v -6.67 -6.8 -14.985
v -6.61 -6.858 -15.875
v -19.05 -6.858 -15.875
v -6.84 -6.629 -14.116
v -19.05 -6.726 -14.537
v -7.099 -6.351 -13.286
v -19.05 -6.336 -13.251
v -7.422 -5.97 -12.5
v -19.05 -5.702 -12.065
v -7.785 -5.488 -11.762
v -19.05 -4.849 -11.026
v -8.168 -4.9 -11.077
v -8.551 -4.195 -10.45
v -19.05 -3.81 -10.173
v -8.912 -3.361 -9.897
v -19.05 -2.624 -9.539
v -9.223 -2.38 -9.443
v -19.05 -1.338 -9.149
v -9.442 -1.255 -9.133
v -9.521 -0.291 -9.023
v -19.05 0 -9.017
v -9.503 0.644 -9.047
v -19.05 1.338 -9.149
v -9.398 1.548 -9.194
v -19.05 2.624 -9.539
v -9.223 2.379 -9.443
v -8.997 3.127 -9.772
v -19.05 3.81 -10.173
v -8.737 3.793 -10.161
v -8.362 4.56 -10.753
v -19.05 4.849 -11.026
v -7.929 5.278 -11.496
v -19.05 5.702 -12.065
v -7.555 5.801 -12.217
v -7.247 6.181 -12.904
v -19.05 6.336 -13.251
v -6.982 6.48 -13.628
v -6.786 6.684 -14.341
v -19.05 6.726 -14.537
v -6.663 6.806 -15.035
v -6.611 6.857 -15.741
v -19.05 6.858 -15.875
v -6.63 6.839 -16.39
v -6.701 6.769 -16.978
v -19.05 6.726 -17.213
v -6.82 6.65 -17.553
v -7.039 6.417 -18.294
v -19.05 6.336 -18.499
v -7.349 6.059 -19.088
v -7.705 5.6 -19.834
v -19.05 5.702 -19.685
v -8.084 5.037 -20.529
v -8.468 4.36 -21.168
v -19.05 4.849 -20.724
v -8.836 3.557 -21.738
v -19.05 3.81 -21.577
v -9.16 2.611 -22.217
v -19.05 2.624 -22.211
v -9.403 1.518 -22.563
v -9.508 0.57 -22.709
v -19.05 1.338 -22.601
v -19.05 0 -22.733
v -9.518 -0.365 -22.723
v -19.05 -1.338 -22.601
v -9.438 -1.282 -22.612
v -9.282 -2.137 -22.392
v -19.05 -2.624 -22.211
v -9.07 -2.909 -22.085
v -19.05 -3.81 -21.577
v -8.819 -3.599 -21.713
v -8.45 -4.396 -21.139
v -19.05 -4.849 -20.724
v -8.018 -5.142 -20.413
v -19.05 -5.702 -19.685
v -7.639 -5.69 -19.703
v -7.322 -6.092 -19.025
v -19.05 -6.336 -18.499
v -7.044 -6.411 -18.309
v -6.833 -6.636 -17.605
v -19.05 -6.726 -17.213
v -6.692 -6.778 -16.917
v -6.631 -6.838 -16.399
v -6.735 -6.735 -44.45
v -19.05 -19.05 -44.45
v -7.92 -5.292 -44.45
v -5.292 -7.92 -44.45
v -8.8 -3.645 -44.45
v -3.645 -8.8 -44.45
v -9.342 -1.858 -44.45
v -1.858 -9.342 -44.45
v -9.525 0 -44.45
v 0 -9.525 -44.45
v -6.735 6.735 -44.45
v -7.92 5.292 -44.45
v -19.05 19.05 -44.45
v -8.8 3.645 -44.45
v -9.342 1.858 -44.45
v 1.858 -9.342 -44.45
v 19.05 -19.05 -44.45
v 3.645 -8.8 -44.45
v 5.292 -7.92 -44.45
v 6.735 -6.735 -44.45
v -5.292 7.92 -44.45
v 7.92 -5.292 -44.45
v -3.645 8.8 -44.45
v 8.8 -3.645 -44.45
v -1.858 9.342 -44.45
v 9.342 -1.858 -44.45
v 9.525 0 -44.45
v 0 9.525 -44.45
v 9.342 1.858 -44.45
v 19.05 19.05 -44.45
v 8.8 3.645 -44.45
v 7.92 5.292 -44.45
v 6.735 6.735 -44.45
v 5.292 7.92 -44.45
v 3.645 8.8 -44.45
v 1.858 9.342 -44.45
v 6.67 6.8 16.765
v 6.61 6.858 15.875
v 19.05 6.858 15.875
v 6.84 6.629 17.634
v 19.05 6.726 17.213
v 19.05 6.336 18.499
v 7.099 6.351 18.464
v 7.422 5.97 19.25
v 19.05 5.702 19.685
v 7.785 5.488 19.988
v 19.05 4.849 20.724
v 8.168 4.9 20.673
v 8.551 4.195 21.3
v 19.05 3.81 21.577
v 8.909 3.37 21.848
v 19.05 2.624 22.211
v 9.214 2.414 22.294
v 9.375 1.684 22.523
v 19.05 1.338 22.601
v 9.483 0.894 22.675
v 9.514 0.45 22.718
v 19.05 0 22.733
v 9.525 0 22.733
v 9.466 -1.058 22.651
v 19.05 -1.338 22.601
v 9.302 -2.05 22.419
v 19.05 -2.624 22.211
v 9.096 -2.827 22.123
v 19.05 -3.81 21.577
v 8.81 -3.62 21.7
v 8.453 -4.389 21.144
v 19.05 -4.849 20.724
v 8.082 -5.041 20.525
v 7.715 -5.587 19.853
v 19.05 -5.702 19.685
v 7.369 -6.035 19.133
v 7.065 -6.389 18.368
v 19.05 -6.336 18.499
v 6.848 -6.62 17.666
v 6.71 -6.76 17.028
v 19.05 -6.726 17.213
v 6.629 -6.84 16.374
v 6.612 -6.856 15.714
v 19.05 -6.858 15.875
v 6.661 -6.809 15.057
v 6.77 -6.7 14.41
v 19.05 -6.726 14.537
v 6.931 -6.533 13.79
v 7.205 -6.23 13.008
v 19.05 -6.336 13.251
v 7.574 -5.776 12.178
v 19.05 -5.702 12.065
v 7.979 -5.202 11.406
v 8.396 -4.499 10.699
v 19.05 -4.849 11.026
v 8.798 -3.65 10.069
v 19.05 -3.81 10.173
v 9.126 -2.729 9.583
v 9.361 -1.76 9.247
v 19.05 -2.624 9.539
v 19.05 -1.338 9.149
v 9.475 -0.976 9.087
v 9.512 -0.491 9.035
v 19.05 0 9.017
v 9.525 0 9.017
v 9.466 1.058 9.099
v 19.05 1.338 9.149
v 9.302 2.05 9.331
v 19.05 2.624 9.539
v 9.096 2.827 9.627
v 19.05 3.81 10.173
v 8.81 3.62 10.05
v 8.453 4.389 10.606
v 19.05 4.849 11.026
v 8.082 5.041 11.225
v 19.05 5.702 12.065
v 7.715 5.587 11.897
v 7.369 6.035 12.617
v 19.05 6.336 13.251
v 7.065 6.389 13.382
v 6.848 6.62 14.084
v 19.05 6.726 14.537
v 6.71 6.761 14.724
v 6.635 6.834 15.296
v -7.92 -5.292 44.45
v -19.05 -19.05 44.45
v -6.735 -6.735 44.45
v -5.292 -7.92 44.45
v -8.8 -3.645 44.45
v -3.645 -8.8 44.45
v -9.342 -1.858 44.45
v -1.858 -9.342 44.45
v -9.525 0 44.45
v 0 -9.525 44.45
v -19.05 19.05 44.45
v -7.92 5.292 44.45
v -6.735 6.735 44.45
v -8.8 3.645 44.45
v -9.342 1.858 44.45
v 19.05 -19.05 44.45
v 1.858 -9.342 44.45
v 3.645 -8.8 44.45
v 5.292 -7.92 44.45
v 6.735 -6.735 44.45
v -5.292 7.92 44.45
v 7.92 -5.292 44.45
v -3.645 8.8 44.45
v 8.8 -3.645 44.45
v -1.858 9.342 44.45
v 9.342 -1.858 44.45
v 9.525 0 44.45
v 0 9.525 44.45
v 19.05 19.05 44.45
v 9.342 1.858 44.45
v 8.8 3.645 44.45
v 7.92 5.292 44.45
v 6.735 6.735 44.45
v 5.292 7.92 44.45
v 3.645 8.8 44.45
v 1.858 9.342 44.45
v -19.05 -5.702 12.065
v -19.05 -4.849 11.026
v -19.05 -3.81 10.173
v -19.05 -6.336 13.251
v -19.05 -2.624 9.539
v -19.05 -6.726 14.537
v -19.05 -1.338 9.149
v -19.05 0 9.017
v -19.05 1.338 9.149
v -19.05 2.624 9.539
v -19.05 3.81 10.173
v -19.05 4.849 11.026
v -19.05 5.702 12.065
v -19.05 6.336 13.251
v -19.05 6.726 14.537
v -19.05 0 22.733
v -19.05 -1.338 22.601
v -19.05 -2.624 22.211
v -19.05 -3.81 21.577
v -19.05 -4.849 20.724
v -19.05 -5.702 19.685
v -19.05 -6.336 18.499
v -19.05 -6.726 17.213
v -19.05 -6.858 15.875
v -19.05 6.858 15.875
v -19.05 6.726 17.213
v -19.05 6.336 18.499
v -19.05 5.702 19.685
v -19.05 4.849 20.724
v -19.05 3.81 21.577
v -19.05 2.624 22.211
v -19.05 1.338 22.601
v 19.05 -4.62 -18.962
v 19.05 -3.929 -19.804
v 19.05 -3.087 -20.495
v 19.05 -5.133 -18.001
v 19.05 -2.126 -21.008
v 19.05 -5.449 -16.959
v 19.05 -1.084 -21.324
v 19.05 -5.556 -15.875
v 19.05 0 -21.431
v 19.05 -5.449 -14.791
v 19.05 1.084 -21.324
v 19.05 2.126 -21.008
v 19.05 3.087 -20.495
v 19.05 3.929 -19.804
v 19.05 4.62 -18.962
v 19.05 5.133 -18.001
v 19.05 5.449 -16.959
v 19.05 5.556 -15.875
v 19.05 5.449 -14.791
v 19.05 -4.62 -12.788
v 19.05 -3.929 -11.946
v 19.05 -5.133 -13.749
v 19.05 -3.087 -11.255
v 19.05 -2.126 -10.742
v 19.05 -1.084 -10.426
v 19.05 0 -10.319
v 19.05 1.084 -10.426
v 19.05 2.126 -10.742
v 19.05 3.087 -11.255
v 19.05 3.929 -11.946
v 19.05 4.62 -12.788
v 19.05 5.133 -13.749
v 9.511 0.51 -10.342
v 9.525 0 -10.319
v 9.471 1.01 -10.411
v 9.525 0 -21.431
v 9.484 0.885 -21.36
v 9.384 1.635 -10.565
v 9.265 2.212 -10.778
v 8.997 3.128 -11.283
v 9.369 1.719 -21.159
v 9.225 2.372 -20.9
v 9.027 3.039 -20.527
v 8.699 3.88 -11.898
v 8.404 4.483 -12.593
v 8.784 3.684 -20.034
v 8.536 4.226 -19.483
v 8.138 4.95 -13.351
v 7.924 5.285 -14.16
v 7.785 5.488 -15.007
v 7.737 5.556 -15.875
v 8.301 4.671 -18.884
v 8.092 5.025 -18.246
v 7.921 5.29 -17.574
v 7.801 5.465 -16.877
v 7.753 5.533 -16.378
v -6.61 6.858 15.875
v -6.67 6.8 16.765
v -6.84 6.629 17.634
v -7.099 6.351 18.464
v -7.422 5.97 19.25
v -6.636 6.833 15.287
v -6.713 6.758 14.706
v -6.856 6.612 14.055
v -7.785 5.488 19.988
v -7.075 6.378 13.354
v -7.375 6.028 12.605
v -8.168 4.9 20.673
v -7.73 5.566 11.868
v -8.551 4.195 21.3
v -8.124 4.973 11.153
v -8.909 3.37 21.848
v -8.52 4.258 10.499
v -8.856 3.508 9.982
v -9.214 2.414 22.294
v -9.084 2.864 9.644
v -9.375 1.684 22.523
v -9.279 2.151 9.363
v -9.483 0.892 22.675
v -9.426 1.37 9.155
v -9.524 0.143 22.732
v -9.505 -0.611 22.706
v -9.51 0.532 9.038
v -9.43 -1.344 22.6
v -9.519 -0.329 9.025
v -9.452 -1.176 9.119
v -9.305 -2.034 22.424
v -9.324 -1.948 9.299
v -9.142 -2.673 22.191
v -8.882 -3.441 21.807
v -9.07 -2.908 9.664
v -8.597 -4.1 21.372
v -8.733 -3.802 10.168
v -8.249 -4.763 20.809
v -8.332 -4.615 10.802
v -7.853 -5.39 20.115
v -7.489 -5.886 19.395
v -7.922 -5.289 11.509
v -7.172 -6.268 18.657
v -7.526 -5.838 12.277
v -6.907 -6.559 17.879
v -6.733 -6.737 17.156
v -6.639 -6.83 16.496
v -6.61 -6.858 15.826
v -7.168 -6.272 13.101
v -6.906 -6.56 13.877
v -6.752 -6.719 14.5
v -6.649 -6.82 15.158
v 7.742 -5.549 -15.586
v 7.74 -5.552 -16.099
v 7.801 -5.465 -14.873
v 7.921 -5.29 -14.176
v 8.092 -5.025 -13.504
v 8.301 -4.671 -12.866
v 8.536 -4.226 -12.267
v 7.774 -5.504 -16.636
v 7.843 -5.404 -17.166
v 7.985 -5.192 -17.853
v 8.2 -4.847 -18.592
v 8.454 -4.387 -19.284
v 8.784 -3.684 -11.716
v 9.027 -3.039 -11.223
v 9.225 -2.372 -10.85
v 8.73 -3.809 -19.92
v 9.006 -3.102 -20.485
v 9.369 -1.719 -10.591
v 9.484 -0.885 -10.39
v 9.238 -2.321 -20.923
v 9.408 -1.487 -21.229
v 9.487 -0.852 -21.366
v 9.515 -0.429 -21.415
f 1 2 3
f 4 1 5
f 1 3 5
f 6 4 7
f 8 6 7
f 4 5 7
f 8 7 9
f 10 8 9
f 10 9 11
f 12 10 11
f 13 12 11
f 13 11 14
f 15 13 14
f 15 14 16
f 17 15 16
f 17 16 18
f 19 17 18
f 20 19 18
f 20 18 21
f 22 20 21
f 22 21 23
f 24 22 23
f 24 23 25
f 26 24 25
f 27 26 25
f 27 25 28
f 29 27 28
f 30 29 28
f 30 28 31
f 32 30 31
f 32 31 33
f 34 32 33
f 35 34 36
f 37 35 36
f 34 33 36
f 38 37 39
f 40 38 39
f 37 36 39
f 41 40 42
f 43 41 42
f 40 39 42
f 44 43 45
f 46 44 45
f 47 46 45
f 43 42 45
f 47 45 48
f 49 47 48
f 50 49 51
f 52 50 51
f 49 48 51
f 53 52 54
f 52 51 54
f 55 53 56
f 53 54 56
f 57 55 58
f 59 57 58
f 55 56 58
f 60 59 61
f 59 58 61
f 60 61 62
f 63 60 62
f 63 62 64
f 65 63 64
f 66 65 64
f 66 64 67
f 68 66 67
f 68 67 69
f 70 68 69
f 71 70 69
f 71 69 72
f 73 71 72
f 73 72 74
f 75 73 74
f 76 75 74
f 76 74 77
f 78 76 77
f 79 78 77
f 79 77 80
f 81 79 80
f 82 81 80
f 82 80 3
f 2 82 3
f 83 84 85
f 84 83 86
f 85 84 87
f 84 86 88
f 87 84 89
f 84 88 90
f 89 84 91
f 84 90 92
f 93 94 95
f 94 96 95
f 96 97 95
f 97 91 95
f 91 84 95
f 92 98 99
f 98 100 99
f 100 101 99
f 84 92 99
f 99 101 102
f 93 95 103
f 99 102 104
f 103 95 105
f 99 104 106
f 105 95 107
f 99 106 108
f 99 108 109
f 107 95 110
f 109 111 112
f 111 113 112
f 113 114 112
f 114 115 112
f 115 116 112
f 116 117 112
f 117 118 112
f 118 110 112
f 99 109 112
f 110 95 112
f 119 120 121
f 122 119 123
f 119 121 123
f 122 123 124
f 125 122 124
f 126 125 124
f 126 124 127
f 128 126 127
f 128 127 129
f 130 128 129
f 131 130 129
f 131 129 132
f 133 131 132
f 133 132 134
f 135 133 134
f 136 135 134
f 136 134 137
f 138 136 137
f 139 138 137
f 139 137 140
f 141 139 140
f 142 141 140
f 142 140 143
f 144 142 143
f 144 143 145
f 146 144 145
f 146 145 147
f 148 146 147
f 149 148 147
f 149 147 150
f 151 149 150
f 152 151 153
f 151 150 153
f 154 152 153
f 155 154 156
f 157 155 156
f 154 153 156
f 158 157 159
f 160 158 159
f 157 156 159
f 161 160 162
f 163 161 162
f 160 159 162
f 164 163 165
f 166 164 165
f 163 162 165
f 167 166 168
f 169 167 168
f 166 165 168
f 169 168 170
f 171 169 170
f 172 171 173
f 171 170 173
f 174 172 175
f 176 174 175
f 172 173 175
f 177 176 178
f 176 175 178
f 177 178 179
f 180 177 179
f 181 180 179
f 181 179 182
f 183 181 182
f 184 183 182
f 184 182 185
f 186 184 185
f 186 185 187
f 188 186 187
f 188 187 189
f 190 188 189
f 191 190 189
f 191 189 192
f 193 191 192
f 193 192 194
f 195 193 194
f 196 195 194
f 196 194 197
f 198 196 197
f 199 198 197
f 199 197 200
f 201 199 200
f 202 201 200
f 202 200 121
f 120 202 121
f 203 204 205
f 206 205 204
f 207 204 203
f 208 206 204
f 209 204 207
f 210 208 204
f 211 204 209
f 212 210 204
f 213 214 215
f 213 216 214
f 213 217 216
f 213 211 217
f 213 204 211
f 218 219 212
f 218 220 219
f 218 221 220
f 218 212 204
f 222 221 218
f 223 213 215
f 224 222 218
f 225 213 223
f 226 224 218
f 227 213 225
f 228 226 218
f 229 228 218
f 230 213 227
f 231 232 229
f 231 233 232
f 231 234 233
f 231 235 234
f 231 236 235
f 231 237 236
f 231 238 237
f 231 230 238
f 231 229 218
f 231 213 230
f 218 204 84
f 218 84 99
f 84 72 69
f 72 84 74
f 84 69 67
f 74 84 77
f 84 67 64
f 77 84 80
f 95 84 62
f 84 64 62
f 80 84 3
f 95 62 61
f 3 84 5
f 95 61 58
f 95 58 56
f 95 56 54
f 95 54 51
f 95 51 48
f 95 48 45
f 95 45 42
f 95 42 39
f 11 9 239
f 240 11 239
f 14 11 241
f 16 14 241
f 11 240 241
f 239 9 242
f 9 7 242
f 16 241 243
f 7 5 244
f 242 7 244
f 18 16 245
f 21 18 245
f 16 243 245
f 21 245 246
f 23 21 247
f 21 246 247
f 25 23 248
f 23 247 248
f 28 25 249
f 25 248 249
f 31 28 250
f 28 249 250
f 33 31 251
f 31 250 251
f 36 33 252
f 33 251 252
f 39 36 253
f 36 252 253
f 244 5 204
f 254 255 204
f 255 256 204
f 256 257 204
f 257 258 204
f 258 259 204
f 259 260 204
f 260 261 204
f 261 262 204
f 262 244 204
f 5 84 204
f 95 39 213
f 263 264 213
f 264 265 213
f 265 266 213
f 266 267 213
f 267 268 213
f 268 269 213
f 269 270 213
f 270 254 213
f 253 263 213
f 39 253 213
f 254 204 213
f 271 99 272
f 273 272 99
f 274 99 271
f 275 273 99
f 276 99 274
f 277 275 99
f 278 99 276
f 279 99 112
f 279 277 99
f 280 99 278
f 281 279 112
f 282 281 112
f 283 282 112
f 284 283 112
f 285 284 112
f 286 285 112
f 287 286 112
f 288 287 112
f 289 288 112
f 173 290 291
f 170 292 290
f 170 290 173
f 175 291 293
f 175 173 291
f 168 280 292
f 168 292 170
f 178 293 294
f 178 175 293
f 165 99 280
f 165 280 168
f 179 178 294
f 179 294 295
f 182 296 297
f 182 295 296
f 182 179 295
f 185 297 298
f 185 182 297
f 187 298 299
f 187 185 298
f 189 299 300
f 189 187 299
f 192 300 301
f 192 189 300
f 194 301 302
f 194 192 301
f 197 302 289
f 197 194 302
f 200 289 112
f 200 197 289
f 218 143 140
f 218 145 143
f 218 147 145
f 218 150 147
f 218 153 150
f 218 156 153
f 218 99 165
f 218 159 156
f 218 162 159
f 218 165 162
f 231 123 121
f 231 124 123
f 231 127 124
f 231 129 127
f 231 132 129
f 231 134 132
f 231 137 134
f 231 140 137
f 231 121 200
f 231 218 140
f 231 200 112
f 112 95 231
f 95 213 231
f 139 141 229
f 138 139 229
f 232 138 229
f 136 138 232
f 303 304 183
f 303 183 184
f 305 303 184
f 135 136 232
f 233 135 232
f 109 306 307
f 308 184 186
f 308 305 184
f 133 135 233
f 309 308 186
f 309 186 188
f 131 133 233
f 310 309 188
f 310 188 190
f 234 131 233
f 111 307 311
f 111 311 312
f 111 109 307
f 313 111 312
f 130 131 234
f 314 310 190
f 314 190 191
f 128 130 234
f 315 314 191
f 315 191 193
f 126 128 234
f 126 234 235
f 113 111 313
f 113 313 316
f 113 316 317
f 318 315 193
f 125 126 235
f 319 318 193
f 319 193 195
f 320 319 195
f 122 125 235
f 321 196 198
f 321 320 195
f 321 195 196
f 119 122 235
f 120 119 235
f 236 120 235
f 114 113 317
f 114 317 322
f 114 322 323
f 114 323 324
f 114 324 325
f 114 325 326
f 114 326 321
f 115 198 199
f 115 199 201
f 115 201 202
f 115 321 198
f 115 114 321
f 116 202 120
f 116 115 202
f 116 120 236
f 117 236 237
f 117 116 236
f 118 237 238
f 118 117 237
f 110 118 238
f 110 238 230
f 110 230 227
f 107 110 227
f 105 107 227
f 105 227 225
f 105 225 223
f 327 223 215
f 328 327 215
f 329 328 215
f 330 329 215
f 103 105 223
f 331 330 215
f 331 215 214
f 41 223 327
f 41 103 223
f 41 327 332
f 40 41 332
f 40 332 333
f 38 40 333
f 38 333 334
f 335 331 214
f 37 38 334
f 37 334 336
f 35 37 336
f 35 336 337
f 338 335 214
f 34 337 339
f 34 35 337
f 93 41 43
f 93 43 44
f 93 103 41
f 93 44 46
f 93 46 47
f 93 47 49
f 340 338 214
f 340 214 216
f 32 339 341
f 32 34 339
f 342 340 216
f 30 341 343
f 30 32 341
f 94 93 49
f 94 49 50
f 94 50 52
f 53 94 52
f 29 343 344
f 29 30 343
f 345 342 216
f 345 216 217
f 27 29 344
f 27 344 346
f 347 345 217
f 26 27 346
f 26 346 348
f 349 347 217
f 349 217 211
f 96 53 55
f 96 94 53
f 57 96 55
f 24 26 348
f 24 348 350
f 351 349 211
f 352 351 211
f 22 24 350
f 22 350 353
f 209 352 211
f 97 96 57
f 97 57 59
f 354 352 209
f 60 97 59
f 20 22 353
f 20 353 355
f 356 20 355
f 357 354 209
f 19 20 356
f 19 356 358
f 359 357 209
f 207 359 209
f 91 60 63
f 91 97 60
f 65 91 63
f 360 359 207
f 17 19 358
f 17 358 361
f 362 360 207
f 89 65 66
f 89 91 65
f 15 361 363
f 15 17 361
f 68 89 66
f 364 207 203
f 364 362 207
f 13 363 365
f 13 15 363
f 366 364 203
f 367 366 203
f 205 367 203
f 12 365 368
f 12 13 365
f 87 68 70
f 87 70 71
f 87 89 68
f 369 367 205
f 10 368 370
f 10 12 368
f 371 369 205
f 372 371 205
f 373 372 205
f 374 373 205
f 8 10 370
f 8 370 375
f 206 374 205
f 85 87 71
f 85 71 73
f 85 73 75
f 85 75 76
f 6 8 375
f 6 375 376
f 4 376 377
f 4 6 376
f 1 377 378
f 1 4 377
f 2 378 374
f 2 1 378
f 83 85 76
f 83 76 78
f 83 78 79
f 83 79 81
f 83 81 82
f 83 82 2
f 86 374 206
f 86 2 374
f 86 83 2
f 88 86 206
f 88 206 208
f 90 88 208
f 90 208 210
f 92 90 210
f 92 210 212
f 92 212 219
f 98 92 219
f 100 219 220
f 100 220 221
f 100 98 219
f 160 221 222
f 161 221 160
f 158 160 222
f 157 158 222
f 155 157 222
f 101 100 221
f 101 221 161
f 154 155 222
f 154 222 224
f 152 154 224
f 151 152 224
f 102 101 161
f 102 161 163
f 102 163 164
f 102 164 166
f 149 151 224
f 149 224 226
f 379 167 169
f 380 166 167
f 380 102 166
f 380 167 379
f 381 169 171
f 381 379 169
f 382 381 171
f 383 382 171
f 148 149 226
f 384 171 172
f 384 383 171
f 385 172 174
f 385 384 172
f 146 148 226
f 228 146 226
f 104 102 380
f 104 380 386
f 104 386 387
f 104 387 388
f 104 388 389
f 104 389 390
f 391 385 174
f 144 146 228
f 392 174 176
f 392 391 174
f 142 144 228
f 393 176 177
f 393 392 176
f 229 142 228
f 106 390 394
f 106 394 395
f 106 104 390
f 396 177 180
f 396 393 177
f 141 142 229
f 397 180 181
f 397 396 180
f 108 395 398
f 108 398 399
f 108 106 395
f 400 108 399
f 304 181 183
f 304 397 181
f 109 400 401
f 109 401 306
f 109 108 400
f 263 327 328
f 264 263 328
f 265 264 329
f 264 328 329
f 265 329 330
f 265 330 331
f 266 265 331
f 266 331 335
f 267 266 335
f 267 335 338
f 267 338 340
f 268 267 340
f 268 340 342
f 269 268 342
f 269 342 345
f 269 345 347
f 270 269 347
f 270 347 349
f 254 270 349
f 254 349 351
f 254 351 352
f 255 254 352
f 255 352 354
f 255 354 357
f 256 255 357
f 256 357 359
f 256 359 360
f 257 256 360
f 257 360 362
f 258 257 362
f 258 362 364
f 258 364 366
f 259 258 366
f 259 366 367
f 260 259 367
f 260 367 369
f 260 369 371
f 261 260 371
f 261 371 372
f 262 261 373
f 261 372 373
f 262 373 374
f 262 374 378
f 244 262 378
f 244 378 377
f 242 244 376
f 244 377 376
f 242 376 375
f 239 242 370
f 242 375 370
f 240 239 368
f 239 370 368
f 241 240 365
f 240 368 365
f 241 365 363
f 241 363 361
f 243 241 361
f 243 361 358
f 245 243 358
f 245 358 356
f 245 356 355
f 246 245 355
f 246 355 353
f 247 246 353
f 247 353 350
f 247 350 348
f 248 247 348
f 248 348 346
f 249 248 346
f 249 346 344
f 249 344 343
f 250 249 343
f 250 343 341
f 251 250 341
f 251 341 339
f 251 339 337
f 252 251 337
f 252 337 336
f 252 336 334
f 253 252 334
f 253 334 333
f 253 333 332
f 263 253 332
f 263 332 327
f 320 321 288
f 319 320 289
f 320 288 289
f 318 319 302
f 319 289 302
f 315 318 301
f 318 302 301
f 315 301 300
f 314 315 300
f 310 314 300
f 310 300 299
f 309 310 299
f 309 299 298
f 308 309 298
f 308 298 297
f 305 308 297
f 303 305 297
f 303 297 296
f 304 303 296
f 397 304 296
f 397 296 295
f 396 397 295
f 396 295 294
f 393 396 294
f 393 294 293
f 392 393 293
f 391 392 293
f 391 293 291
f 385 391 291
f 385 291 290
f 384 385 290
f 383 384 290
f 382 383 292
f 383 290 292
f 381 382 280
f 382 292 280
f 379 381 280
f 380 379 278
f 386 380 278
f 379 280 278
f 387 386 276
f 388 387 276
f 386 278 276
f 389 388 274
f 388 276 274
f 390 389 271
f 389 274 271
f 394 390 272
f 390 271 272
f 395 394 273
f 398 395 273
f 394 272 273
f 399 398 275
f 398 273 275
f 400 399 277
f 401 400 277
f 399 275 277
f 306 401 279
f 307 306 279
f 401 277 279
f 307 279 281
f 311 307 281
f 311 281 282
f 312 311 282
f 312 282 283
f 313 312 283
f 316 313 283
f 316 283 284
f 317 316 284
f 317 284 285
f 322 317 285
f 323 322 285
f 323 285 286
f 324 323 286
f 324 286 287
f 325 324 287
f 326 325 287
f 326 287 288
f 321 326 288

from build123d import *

# Parameters (mm, degrees)
SKETCH1_W           = 38.1
SKETCH1_H           = 38.1
SKETCH1_R           = 9.525
BOSS_EXTRUDE1_DEPTH = 44.45
SKETCH2_R           = 6.858
CUT_EXTRUDE1_DEPTH  = 62.565534189
SKETCH3_R           = 5.55625
CUT_EXTRUDE2_DEPTH  = 19.05
SKETCH4_R           = 6.858
CUT_EXTRUDE3_DEPTH  = 19.05


with BuildPart() as part:
    # Sketch1 → Boss-Extrude1 (new, symmetric)
    with BuildSketch(Plane.XY):
        Rectangle(SKETCH1_W, SKETCH1_H)
        Circle(SKETCH1_R, mode=Mode.SUBTRACT)
    extrude(amount=BOSS_EXTRUDE1_DEPTH, both=True)

    # Sketch2 → Cut-Extrude1 (cut, through all)
    with BuildSketch(Plane(origin=(19.05, 0, 0), x_dir=(0, 0, -1), z_dir=(1, 0, 0))):
        with Locations(Location((-15.875, 0, 0), (0, 0, 90))):
            Circle(SKETCH2_R)
    extrude(amount=-CUT_EXTRUDE1_DEPTH, mode=Mode.SUBTRACT)

    # Sketch3 → Cut-Extrude2 (cut)
    with BuildSketch(Plane(origin=(19.05, 0, 0), x_dir=(0, 0, -1), z_dir=(1, 0, 0))):
        with Locations(Location((15.875, 0, 0), (0, 0, 90))):
            Circle(SKETCH3_R)
    extrude(amount=-CUT_EXTRUDE2_DEPTH, mode=Mode.SUBTRACT)

    # Sketch4 → Cut-Extrude3 (cut)
    with BuildSketch(Plane.ZY.offset(19.05)):
        with Locations(Location((-15.875, 0, 0), (0, 0, 270))):
            Circle(SKETCH4_R)
    extrude(amount=-CUT_EXTRUDE3_DEPTH, mode=Mode.SUBTRACT)


solid = part.part
